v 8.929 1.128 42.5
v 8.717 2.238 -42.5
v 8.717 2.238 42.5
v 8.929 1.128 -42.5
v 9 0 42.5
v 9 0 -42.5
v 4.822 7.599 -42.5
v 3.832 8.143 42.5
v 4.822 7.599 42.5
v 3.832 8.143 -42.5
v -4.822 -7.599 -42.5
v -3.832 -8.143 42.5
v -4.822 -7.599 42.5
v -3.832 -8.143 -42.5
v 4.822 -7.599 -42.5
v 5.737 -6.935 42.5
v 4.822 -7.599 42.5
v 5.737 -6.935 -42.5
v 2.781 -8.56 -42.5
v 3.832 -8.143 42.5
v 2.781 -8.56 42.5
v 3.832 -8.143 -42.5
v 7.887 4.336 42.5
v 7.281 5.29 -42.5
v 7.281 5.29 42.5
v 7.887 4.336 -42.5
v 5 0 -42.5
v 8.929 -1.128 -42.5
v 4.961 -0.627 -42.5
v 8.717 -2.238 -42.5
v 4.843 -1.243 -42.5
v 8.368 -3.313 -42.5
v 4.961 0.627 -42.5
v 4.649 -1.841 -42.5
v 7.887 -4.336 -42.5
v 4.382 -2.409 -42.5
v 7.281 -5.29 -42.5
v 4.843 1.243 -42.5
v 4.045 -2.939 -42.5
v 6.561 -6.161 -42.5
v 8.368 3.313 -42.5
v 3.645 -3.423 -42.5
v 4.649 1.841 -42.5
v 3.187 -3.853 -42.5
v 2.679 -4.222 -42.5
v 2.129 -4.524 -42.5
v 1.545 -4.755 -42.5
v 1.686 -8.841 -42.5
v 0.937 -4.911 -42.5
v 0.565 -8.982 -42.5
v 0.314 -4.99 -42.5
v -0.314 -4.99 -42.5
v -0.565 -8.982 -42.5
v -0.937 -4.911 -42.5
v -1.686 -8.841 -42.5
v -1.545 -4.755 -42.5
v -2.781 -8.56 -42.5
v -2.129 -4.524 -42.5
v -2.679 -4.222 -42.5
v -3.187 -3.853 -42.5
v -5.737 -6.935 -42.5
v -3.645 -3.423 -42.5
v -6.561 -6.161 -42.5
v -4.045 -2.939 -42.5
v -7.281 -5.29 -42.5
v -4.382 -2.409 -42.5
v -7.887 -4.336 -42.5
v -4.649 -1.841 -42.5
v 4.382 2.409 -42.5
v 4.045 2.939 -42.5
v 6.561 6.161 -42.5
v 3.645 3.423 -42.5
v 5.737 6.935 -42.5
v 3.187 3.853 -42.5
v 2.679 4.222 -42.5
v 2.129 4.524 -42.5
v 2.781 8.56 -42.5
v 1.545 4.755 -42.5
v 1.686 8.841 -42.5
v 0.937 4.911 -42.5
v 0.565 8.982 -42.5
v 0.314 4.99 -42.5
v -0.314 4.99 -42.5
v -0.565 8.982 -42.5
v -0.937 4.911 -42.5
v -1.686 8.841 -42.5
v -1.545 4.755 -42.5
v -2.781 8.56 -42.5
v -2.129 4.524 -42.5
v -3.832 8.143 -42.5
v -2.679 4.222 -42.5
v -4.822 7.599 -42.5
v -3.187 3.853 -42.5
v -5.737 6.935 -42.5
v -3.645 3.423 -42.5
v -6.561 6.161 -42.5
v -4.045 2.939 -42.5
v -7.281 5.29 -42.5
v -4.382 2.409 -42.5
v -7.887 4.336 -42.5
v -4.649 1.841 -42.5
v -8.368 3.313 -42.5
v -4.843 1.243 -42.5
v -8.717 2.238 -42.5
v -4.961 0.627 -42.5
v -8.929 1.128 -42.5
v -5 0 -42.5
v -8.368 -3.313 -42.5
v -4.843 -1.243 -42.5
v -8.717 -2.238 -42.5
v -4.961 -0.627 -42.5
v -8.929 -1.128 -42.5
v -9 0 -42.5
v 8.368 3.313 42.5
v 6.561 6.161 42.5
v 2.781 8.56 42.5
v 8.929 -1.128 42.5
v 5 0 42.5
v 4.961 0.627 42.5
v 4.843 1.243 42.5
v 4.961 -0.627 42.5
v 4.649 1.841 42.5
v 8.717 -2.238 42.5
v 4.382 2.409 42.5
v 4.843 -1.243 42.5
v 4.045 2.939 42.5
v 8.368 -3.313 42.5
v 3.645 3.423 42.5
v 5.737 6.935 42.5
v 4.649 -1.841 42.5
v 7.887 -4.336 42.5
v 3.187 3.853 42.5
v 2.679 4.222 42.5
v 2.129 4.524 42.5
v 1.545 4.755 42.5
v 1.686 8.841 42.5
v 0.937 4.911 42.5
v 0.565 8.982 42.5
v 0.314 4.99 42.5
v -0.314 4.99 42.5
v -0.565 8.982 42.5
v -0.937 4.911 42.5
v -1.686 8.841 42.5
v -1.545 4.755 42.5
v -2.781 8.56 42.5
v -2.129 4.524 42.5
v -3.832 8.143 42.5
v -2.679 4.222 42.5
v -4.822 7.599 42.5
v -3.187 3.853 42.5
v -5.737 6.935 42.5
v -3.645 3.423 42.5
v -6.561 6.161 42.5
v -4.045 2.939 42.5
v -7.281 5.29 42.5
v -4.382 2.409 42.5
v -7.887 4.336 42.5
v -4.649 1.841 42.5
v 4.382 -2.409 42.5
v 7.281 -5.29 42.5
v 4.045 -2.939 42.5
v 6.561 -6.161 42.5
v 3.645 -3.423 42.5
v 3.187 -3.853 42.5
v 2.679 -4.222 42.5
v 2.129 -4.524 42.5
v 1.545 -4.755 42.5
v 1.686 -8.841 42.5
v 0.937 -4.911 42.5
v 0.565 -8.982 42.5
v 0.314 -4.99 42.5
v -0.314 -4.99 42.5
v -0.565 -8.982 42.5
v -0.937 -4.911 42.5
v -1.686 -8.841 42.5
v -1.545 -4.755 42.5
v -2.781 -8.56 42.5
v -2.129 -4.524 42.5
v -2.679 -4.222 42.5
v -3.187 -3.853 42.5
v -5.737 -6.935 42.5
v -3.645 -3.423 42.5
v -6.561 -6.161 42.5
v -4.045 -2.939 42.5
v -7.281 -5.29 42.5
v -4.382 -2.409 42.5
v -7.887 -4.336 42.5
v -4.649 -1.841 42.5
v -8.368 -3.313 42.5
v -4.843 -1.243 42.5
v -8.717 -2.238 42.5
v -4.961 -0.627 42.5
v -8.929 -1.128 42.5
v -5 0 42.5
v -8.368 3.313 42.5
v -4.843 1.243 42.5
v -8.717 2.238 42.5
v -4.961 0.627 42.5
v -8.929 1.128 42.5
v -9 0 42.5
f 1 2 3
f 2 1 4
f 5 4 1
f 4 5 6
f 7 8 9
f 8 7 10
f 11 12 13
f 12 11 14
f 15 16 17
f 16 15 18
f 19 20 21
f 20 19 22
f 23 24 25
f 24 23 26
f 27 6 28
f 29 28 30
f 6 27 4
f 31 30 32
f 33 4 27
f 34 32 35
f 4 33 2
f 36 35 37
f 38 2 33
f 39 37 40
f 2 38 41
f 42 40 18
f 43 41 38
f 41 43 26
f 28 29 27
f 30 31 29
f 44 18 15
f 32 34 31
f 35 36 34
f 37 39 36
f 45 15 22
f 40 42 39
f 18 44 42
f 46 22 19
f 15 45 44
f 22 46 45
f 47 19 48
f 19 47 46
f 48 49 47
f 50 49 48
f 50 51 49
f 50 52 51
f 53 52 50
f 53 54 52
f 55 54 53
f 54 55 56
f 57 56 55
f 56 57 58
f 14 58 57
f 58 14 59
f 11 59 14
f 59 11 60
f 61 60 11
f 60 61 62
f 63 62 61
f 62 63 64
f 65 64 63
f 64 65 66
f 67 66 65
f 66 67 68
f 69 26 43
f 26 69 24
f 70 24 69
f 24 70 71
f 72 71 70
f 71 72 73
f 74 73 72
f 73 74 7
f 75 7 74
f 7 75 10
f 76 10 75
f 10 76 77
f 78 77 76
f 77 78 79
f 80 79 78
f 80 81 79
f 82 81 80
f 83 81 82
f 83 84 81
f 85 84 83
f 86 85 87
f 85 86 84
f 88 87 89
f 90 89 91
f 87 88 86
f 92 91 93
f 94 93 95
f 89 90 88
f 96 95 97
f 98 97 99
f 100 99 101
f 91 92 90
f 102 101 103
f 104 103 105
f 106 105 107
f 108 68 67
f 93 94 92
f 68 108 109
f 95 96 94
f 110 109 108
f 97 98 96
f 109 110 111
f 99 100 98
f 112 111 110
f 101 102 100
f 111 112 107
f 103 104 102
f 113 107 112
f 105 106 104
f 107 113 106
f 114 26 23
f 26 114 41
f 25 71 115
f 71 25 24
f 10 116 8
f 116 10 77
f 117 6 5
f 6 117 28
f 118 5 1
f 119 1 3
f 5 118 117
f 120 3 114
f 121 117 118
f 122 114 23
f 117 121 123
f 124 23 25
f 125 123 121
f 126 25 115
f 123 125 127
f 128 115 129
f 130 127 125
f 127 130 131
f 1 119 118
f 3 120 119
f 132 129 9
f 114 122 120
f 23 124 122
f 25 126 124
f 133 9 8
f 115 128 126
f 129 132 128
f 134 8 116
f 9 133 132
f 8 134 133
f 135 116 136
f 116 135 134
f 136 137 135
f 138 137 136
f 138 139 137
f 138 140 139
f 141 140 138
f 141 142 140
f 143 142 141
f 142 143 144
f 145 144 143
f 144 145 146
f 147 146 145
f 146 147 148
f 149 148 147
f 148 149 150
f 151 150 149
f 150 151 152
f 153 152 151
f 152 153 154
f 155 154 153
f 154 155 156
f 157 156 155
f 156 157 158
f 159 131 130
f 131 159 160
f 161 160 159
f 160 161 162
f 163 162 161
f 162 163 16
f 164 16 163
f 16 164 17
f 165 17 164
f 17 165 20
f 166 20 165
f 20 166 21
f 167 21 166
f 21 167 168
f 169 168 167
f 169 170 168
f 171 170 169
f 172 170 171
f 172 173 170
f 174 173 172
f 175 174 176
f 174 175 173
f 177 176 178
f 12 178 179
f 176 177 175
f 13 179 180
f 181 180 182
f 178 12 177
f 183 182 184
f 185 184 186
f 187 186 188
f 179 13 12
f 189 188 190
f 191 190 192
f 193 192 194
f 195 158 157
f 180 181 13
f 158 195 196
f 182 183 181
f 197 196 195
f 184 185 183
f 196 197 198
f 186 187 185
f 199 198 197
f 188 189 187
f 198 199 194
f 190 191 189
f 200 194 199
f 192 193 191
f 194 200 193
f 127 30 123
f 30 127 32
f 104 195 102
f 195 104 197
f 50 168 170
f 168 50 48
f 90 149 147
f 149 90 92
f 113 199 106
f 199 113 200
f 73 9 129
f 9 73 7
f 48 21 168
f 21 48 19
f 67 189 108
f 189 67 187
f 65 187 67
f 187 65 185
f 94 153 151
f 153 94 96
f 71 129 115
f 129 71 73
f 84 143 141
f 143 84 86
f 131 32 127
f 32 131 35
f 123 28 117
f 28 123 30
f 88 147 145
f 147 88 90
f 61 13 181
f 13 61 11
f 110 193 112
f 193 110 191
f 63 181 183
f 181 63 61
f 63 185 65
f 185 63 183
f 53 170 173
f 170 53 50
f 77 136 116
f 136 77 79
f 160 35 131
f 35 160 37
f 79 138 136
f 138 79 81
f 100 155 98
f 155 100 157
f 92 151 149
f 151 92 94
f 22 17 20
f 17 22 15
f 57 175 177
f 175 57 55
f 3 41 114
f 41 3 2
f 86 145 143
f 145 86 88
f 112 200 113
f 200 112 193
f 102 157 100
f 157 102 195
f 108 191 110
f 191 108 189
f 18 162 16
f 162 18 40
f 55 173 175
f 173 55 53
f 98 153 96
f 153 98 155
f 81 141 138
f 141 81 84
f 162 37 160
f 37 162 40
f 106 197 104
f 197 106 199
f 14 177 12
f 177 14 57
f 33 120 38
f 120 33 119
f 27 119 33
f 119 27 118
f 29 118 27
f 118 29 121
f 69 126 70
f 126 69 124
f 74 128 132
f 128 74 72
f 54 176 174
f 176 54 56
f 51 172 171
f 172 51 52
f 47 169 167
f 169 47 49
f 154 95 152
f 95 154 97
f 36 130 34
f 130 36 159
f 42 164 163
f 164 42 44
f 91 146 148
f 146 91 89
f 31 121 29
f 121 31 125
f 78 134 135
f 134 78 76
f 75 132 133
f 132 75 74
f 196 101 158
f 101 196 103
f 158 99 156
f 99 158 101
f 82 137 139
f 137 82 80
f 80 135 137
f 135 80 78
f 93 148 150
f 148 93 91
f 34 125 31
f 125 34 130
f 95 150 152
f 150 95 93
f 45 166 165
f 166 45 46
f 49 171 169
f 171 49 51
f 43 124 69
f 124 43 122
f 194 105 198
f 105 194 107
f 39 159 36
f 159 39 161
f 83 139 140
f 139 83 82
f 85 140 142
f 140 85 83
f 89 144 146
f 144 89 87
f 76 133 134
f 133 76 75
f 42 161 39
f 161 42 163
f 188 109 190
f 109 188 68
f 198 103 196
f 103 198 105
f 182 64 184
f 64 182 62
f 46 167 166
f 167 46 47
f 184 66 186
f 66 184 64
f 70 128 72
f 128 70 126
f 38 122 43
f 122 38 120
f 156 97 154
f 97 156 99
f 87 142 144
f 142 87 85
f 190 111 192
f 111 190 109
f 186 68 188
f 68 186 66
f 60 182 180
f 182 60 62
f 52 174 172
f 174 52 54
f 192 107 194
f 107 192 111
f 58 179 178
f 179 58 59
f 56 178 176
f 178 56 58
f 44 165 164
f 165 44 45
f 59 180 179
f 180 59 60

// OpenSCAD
$fn = 50;


difference() {
	union() {
		translate(v = [0, 0, -42.5000000000]) {
			cylinder(h = 85, r = 9.0000000000);
		}
	}
	union() {
		translate(v = [0, 0, -100.0000000000]) {
			cylinder(h = 200, r = 5.0000000000);
		}
	}
}
